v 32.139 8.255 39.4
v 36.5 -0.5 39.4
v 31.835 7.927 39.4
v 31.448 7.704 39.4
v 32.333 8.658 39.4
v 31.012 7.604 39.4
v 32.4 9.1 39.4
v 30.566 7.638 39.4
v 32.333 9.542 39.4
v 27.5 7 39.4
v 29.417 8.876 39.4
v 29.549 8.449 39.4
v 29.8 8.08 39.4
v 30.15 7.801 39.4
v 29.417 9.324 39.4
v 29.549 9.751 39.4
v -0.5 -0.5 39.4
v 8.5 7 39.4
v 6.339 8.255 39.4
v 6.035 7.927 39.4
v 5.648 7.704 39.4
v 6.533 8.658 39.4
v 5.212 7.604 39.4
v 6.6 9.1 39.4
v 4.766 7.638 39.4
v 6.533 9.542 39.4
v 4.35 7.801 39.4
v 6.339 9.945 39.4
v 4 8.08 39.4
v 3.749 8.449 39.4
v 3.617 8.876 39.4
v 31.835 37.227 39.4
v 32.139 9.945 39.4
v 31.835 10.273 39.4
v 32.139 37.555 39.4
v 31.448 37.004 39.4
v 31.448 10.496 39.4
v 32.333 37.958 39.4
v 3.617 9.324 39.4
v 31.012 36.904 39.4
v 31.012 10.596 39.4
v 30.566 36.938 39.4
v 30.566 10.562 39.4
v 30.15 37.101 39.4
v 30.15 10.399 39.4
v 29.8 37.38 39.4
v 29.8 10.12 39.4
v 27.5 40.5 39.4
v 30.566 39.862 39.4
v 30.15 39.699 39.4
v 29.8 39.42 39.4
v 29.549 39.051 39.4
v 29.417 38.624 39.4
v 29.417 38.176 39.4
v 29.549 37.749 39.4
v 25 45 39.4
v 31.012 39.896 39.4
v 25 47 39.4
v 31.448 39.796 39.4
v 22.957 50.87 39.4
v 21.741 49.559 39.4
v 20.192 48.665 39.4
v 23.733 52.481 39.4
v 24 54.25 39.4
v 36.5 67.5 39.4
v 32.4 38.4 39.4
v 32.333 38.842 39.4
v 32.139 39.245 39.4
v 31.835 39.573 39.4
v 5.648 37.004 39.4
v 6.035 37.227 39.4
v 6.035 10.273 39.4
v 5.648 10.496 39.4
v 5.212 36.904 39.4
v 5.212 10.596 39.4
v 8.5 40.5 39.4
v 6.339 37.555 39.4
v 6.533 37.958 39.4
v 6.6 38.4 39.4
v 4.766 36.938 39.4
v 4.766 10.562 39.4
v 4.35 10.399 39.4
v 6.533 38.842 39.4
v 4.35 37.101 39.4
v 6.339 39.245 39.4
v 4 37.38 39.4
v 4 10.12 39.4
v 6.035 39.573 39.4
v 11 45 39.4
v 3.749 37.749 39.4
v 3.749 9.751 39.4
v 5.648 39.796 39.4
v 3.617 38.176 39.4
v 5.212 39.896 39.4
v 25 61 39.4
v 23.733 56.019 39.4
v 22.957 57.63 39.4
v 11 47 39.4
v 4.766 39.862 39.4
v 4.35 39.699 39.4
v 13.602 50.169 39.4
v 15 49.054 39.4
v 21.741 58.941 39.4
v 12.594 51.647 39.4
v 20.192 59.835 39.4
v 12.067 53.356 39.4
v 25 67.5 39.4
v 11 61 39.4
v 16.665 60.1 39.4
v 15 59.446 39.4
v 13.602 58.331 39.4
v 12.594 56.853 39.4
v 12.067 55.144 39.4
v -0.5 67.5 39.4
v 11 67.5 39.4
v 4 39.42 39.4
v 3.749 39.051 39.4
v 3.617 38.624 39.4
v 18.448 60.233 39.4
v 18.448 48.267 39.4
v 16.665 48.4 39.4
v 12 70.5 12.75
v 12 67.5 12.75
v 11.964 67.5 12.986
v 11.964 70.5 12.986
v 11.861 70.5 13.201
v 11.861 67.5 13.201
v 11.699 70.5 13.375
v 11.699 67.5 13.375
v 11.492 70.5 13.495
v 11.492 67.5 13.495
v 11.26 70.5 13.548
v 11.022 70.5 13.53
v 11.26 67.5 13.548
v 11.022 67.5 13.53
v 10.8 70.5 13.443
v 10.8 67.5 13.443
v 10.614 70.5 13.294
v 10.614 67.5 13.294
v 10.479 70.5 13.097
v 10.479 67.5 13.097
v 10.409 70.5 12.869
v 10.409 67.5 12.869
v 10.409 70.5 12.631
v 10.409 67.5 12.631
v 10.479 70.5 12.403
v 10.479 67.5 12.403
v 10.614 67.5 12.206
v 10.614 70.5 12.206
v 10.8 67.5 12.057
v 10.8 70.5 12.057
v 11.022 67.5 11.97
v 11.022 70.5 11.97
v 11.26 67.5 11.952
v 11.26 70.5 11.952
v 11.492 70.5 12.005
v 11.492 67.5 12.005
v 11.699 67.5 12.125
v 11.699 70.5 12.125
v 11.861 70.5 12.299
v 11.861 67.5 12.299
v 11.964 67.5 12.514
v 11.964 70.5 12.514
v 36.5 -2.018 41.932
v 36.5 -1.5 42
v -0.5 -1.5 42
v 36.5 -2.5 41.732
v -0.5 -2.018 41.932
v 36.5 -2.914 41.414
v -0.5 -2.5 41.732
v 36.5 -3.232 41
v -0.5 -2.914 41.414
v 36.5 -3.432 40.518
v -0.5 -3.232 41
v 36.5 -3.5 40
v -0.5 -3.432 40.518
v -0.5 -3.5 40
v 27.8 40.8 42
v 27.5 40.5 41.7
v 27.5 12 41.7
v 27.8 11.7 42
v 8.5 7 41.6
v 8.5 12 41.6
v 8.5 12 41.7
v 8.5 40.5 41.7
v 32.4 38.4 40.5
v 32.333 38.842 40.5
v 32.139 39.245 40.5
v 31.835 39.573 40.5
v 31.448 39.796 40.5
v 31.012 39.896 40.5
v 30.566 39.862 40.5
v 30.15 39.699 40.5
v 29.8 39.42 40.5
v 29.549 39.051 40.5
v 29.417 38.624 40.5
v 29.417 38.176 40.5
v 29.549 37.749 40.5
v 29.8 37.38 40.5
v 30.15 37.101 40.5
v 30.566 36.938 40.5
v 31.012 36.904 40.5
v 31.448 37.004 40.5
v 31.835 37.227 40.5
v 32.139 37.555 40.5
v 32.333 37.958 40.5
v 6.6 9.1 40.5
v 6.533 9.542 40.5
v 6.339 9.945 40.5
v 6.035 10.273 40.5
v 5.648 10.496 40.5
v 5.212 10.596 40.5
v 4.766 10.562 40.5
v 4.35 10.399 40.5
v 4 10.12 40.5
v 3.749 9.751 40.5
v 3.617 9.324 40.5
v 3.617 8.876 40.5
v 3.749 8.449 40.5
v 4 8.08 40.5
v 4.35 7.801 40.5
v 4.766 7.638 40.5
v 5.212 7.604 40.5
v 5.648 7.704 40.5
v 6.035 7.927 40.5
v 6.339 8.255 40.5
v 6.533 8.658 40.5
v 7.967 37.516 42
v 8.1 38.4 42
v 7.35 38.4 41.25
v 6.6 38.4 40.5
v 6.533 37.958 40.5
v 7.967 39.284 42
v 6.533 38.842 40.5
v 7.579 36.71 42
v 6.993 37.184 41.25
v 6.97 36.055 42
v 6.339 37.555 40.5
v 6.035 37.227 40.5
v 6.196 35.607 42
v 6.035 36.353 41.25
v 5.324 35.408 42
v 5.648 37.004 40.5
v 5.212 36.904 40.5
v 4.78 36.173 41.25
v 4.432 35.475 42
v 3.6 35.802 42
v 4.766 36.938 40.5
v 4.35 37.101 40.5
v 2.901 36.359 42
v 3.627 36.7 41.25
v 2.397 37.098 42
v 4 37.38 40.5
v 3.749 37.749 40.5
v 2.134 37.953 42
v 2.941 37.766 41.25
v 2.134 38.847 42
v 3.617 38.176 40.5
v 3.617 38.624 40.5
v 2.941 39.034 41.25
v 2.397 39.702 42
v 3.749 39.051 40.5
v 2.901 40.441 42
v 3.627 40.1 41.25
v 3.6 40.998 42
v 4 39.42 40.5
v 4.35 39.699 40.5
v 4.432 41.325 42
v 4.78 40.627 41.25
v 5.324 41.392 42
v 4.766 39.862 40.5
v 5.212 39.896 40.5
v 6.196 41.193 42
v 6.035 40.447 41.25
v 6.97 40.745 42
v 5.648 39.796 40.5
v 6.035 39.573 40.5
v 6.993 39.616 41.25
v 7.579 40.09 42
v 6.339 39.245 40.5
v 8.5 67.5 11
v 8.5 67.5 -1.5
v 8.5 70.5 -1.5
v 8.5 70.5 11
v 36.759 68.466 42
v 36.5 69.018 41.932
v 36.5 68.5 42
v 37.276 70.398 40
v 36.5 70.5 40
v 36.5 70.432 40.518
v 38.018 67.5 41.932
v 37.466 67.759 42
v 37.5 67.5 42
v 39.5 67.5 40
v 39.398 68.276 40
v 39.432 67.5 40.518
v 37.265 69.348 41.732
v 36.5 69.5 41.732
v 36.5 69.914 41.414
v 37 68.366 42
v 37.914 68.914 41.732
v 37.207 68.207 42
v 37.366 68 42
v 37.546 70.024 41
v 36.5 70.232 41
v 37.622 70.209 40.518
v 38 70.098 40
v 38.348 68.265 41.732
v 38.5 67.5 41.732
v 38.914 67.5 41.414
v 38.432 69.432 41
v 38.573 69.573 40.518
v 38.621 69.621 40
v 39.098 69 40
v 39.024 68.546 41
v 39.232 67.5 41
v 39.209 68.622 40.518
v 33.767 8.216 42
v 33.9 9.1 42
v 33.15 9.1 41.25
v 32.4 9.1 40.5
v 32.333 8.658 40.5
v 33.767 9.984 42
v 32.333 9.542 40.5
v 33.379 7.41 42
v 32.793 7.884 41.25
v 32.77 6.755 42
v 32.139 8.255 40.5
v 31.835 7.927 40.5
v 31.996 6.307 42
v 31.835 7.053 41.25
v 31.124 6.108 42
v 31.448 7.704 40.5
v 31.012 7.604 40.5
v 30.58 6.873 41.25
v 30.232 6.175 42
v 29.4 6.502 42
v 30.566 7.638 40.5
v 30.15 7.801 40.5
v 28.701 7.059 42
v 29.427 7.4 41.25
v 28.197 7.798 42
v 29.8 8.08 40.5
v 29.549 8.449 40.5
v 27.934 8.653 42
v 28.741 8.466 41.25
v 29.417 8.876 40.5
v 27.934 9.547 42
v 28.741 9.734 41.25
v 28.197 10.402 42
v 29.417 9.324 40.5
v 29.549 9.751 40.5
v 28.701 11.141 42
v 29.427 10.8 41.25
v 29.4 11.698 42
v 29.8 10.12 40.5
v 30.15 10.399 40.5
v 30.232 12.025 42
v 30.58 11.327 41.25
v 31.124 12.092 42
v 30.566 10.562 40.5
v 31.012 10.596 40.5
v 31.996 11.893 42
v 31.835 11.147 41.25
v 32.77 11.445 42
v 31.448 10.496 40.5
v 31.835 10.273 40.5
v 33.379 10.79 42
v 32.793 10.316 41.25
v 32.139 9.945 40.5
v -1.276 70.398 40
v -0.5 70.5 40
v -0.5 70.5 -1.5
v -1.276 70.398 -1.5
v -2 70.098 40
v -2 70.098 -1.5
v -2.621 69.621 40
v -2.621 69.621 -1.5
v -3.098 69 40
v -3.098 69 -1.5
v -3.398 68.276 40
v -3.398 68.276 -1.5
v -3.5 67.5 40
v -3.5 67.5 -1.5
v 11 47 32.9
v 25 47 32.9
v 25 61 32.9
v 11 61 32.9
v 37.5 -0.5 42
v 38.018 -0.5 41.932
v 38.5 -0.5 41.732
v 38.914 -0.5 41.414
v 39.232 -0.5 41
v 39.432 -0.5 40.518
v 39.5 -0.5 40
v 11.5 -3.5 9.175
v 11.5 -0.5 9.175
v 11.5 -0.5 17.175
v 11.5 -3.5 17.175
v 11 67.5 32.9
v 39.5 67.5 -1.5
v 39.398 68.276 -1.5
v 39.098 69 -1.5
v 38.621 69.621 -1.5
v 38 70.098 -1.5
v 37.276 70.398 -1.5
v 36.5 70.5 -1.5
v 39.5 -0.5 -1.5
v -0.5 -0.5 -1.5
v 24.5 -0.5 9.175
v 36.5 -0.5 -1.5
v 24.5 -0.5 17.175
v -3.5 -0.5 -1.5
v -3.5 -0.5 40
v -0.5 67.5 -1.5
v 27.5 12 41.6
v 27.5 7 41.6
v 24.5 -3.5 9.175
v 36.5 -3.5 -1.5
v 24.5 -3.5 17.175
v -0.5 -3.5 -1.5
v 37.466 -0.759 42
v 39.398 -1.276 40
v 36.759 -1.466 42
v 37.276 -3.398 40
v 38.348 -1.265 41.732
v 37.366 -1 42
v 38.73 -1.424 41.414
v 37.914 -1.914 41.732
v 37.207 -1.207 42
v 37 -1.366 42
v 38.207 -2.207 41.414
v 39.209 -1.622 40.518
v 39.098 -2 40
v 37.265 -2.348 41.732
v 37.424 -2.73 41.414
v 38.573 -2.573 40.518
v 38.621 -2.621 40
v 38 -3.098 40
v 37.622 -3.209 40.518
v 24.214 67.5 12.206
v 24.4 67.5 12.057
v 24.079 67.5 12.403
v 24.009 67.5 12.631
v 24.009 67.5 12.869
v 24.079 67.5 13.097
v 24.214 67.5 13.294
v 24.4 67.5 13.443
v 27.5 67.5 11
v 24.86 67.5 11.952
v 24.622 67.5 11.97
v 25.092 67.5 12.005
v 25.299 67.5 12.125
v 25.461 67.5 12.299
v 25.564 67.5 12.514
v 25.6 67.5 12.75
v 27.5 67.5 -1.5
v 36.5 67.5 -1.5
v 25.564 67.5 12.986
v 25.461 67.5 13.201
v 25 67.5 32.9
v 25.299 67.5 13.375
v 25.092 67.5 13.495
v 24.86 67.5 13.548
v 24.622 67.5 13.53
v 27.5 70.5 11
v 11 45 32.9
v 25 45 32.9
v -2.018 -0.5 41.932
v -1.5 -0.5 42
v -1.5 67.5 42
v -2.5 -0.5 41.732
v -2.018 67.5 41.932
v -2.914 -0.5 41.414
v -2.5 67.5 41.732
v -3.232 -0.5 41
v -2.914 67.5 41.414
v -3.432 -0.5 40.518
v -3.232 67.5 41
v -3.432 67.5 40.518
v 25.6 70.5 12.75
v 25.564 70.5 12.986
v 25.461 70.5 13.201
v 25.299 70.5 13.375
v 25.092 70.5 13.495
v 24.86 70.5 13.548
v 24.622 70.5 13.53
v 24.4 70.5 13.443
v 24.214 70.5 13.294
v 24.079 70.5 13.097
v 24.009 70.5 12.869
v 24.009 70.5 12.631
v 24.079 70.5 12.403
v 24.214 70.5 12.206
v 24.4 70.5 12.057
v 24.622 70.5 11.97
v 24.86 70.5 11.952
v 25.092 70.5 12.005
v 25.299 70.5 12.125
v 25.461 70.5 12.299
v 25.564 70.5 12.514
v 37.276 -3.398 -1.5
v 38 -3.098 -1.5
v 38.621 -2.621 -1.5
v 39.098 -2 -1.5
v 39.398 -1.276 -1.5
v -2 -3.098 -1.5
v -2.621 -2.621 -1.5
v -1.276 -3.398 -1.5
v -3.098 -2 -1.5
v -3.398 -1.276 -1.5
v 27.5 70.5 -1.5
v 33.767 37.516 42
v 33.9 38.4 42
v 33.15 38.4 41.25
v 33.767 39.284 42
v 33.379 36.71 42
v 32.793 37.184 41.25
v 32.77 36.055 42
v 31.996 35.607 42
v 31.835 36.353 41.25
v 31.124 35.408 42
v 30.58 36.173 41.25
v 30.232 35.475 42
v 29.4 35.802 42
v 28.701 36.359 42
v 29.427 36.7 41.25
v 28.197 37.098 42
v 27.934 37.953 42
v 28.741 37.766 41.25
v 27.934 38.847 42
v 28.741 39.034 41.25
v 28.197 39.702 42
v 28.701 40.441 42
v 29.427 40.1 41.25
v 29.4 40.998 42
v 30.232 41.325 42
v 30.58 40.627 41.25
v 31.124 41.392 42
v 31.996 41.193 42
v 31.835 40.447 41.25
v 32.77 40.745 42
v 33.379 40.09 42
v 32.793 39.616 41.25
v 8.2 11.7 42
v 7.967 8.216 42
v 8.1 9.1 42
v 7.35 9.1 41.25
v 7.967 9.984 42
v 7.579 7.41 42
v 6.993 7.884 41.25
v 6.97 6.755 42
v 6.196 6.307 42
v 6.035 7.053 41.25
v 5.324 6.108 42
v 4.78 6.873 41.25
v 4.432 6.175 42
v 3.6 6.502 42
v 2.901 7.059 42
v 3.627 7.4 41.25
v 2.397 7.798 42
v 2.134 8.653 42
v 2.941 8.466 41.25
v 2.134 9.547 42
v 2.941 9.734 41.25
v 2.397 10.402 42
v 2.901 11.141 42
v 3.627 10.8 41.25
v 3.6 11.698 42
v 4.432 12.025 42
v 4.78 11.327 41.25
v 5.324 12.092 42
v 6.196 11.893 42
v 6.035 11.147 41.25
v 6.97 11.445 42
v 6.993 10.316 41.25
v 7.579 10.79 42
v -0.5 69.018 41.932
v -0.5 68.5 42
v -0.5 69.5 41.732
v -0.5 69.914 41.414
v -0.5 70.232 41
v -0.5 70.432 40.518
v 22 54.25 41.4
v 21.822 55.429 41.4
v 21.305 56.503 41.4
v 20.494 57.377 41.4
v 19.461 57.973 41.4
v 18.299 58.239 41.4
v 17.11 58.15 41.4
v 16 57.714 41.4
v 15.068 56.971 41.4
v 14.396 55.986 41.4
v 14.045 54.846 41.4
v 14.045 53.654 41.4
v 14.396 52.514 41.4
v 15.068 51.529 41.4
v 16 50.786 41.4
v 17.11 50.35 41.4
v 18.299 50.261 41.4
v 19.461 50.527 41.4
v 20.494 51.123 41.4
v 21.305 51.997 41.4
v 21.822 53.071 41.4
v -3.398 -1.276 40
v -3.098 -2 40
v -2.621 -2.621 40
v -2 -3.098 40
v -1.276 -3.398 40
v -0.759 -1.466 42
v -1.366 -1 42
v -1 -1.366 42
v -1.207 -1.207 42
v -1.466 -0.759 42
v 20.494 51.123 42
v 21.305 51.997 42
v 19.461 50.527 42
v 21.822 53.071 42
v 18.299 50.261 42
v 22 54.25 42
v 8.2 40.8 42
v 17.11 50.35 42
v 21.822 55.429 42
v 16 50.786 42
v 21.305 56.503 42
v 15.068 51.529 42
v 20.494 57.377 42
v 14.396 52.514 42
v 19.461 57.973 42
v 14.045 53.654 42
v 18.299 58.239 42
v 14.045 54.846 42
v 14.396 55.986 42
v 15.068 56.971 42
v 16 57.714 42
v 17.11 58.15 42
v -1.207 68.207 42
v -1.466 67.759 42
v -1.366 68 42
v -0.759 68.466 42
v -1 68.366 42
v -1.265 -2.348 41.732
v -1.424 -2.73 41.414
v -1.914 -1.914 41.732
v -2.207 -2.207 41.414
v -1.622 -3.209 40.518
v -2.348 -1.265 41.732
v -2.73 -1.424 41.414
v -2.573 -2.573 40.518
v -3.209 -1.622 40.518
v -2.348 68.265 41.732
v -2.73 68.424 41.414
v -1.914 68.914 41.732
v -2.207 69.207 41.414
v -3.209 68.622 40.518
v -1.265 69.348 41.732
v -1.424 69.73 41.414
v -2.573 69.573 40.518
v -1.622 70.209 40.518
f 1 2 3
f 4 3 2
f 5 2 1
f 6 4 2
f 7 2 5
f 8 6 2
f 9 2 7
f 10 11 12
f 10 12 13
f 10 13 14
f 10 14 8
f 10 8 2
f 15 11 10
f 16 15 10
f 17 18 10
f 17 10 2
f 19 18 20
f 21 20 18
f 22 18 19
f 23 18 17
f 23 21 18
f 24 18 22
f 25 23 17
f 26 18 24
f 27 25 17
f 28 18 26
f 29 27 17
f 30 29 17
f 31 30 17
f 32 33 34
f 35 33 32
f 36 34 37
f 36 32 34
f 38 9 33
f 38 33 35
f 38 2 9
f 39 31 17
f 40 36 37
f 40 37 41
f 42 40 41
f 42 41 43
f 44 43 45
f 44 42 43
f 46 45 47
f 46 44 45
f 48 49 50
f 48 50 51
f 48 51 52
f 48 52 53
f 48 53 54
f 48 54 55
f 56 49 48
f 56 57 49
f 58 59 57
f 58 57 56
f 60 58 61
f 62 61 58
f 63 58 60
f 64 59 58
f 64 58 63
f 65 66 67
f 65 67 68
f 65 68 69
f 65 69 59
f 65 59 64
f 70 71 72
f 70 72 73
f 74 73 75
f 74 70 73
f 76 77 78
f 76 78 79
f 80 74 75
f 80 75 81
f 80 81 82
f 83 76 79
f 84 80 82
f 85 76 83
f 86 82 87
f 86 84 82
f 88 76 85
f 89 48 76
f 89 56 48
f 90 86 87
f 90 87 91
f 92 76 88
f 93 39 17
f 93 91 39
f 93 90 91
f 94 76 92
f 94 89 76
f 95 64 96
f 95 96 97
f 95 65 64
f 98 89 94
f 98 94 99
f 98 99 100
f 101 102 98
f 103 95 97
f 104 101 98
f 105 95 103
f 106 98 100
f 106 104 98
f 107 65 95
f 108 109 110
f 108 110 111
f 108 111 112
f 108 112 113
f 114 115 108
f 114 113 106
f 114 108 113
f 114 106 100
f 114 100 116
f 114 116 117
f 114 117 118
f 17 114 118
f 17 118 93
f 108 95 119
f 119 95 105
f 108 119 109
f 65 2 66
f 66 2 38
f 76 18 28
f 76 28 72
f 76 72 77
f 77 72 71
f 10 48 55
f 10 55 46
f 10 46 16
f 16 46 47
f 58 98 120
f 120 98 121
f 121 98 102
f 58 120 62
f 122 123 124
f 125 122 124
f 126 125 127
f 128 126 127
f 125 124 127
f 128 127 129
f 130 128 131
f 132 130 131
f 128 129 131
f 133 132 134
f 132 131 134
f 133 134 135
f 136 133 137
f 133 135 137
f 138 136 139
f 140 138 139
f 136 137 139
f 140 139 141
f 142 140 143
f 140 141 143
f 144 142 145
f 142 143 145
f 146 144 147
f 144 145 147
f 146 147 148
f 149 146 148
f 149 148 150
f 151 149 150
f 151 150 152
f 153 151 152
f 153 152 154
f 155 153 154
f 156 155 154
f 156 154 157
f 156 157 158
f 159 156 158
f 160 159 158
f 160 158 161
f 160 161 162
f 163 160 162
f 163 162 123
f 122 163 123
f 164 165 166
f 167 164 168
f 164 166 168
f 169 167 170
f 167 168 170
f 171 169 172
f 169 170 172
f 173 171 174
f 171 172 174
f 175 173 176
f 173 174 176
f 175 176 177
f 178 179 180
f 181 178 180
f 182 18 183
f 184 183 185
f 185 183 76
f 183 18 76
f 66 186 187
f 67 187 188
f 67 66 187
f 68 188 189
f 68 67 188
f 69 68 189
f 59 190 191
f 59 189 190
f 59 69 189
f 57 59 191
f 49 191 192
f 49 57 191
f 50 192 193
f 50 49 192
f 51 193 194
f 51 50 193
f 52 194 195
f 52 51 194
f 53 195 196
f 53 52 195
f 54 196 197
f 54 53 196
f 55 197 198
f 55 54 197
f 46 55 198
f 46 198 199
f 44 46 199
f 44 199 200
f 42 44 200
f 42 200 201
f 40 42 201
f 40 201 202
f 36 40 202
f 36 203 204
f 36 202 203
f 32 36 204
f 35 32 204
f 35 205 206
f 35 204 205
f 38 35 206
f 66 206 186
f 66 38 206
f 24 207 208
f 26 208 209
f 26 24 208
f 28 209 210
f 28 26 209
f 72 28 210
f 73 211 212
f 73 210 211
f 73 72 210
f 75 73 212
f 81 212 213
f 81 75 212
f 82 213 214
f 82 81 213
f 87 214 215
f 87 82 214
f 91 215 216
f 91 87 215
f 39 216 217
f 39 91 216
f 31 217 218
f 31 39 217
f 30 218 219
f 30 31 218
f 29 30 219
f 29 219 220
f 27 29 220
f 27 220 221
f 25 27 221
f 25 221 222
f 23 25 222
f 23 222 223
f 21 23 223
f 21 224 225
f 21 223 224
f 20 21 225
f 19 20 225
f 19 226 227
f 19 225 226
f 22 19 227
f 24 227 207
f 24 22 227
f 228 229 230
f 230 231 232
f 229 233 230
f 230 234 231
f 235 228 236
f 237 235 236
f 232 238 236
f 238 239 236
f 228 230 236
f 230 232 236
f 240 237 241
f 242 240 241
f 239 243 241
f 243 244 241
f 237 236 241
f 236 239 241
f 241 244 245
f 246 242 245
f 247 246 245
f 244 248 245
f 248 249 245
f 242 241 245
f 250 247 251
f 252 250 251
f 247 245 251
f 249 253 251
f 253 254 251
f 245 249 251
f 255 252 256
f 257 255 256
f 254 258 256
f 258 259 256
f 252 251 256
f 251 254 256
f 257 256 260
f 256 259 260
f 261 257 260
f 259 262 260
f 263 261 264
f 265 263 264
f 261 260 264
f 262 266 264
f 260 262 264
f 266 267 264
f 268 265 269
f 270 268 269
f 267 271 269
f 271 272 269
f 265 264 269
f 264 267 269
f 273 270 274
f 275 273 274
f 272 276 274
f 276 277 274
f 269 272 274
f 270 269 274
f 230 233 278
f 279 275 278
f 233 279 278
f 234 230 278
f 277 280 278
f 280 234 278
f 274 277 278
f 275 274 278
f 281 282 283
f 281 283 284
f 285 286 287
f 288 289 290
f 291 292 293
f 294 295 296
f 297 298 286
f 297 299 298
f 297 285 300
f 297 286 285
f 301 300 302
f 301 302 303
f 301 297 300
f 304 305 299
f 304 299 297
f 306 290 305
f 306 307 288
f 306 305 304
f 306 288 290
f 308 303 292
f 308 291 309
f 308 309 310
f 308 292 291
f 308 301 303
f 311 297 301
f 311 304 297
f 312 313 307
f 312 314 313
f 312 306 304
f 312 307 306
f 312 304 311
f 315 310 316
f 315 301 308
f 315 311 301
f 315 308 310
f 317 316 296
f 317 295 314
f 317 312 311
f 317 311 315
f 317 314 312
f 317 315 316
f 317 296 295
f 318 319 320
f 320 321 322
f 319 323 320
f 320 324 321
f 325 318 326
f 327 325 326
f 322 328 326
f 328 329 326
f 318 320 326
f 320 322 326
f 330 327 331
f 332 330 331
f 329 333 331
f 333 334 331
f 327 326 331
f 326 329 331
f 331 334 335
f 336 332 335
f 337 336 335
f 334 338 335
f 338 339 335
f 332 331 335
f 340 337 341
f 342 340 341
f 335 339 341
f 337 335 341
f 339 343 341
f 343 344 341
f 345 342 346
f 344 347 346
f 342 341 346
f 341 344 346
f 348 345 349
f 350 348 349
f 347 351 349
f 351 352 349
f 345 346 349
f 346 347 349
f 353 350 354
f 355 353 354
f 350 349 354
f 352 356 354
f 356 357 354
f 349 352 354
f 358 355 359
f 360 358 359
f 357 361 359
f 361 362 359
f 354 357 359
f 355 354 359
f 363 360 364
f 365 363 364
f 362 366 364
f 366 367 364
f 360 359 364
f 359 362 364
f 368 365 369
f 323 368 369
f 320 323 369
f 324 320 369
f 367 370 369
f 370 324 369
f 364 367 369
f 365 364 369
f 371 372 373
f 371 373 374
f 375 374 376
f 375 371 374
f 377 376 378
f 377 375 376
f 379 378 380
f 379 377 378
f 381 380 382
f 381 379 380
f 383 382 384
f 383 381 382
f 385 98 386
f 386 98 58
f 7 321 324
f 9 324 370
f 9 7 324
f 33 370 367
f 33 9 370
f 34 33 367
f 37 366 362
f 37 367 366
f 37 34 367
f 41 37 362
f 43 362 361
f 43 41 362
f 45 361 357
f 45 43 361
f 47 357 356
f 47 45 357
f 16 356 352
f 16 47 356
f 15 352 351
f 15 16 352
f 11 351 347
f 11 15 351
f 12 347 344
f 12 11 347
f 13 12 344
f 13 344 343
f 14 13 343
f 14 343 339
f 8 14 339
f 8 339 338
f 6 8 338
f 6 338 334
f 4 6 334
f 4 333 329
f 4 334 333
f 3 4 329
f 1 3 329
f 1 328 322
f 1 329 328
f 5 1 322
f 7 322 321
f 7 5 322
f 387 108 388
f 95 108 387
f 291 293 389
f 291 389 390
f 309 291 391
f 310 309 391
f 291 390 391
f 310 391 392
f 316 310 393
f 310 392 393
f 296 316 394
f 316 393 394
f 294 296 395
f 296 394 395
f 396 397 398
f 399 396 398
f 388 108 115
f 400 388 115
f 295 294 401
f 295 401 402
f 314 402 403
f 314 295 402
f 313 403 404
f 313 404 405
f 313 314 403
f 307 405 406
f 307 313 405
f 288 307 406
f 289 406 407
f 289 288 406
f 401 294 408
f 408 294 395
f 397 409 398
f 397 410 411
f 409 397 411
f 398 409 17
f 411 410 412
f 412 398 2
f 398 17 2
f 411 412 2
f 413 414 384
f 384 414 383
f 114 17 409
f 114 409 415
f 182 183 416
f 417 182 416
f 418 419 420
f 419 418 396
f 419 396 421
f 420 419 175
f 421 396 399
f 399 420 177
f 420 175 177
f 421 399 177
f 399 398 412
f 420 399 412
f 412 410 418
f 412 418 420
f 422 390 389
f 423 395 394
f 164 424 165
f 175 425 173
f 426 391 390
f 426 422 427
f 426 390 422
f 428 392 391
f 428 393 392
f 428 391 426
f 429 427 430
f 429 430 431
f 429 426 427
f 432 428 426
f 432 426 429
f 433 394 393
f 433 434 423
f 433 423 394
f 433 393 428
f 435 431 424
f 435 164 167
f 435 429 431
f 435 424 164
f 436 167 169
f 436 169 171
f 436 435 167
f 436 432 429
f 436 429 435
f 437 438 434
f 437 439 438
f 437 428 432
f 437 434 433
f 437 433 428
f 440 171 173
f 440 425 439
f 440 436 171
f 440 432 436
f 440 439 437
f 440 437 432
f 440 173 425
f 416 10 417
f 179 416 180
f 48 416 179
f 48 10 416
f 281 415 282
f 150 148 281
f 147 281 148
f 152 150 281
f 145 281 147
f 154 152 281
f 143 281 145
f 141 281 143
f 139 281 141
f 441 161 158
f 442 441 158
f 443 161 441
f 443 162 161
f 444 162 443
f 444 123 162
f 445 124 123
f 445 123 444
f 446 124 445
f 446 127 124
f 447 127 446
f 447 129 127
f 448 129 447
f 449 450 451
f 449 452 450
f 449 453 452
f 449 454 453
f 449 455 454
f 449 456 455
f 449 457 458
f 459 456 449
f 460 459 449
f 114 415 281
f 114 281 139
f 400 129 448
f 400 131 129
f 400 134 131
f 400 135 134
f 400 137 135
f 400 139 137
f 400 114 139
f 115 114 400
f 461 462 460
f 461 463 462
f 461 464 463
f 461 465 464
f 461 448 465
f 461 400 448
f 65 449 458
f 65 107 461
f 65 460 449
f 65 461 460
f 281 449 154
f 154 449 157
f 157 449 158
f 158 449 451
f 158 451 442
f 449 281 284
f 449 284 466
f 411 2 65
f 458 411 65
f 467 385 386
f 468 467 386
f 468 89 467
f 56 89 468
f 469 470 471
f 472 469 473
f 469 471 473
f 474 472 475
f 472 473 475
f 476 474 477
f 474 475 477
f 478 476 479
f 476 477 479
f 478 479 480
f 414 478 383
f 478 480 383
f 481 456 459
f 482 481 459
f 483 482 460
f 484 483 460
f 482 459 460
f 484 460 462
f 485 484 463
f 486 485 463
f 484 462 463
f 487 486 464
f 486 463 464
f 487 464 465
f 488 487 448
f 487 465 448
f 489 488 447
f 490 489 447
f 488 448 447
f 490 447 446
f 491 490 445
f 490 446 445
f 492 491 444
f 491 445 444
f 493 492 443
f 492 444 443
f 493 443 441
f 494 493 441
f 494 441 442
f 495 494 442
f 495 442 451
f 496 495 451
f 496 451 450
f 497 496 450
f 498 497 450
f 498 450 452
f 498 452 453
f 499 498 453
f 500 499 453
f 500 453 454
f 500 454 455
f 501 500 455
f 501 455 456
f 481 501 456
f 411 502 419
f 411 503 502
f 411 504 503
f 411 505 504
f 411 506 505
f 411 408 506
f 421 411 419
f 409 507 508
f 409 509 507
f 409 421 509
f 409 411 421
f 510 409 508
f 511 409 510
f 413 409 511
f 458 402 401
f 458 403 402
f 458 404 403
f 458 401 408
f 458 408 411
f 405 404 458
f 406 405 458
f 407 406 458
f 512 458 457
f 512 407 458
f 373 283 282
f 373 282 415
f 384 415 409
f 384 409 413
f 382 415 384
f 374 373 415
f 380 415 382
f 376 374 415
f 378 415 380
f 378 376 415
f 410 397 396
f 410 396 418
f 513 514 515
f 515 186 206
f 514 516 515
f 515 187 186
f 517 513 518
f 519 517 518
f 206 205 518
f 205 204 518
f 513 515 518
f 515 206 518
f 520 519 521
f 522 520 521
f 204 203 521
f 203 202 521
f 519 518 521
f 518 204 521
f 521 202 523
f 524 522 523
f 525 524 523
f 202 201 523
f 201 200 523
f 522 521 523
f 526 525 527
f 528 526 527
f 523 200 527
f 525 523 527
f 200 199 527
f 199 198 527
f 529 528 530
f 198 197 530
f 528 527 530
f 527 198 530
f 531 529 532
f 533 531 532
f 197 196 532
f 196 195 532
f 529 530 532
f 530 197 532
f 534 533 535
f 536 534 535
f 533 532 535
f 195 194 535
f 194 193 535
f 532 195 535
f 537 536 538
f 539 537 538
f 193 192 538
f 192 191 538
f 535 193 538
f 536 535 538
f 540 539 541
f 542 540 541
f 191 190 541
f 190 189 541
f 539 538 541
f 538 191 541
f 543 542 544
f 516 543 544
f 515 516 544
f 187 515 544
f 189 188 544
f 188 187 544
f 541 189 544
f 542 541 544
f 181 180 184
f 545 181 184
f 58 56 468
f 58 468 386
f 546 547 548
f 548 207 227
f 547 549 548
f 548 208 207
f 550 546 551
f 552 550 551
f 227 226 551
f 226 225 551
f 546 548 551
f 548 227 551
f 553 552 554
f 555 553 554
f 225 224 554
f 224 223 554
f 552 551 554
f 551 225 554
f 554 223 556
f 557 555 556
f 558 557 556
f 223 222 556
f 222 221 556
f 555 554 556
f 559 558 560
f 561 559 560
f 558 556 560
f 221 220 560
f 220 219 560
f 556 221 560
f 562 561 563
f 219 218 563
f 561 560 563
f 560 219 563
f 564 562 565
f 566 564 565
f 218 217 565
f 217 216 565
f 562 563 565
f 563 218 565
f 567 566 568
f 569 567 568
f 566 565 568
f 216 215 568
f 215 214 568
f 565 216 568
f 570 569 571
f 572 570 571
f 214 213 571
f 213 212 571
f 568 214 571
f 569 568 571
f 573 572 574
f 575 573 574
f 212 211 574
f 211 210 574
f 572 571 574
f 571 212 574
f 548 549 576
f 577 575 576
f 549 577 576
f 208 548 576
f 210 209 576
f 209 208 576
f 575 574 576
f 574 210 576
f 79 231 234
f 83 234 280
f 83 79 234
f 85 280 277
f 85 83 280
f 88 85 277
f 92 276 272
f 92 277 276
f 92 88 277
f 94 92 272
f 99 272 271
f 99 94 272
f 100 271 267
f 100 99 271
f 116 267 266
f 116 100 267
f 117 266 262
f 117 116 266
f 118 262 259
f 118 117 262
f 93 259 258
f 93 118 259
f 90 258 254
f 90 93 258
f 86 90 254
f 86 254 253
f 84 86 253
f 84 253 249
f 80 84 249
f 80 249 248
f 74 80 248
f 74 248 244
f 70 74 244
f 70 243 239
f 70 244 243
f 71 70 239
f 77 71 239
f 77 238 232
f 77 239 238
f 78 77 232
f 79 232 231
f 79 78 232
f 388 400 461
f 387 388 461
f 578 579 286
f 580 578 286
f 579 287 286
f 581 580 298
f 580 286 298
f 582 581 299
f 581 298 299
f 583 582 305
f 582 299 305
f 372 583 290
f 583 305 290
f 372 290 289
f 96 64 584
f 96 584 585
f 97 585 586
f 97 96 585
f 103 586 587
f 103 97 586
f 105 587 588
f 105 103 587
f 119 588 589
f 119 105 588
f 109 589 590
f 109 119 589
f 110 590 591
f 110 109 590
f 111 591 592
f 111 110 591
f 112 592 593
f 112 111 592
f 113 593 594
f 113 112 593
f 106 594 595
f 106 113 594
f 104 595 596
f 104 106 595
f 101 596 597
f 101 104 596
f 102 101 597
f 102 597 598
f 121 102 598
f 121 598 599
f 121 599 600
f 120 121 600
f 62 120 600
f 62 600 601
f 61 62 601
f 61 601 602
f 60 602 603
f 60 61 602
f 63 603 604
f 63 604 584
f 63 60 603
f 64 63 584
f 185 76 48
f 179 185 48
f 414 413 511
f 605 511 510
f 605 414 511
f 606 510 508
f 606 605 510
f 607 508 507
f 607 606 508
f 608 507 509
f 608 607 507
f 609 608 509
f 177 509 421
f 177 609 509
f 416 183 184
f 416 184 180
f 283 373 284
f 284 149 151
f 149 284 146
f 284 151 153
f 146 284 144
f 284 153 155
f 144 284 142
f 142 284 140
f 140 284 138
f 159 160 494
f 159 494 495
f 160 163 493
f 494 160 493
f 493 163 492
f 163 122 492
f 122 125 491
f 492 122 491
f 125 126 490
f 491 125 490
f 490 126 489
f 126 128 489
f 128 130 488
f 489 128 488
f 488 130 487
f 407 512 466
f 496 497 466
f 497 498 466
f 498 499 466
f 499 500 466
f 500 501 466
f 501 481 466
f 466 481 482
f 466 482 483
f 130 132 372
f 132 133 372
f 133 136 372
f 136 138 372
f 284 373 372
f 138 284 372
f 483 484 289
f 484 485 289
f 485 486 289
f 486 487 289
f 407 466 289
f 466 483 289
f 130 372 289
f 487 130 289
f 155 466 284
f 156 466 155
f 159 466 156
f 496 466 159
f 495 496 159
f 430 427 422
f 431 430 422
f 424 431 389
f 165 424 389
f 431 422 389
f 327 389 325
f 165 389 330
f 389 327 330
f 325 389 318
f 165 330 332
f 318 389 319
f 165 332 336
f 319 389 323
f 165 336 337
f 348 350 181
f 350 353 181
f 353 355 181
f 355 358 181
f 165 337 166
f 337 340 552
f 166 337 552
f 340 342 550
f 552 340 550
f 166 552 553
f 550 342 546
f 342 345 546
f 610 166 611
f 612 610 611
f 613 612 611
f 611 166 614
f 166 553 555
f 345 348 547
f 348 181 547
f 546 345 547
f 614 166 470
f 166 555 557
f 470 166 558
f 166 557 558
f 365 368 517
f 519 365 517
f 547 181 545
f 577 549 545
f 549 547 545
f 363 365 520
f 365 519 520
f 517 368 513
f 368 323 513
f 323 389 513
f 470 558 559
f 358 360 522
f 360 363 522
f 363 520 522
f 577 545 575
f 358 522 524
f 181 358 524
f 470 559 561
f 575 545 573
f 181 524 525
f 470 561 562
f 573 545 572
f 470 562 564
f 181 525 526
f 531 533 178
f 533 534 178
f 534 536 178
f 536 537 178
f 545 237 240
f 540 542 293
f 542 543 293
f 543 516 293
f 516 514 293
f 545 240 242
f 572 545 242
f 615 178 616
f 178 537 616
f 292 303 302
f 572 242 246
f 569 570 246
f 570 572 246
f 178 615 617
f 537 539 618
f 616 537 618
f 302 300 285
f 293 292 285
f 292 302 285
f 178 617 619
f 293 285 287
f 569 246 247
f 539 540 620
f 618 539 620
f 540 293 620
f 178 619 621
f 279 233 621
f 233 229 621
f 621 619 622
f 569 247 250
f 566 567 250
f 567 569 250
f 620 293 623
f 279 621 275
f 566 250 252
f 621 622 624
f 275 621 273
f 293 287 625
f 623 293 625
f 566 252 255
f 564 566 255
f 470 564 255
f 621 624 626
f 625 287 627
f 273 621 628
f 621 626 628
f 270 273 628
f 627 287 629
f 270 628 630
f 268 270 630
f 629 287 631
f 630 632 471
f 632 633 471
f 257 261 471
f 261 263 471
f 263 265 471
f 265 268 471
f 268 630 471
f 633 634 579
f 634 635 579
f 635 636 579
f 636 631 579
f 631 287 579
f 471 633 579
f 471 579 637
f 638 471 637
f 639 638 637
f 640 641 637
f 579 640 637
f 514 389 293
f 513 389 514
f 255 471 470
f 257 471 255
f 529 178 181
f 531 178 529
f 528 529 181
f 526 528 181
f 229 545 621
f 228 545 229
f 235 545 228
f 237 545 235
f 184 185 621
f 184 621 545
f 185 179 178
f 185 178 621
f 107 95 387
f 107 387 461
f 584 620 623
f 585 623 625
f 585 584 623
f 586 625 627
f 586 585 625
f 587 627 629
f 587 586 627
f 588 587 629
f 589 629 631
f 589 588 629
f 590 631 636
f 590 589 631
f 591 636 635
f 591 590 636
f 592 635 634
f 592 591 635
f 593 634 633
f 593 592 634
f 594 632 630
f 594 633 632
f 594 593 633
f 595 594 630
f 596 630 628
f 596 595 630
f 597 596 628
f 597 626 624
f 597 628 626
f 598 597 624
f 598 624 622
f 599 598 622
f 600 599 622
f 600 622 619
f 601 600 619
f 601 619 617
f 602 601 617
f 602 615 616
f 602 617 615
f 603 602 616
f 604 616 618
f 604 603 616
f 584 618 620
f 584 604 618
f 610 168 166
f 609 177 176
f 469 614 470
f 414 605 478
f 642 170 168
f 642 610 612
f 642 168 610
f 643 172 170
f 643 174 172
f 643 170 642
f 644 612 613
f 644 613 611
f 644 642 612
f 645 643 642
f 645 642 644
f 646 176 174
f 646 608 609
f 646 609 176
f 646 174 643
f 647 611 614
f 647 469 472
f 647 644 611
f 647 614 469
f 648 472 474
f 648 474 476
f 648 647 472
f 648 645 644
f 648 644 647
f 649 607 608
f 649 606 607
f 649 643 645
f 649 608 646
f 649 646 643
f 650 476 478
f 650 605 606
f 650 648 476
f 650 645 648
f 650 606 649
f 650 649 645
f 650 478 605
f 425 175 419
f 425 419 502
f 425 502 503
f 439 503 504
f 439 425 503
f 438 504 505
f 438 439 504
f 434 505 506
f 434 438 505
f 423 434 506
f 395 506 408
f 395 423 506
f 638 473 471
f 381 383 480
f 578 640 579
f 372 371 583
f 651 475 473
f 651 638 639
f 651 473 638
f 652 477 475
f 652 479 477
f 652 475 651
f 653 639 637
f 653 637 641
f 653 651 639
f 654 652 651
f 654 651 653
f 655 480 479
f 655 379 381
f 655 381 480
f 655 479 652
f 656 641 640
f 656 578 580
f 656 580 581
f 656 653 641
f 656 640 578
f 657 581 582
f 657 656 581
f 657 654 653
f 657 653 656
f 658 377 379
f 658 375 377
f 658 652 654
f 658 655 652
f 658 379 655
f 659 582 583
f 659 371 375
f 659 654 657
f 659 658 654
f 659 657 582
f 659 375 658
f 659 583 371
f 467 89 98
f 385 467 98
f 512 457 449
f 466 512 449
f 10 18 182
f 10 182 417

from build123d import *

# Parameters (mm, degrees)
SKETCH003_W       = 37
SKETCH003_H       = 68
PAD002_DEPTH      = 2.6
SKETCH005_R       = 1.5
SKETCH005_R_2     = 4
SKETCH005_W       = 19
SKETCH005_H       = 28.5
POCKET001_DEPTH   = 2.601
SKETCH014_W       = 37
SKETCH014_H       = 68
PAD009_DEPTH      = 2.6
PAD009_DEPTH_BACK = 40.9
SKETCH019_W       = 13
SKETCH019_H       = 8
POCKET005_DEPTH   = 3.501
CHAMFER001_SIZE   = 1.5
SKETCH020_R       = 0.8
SKETCH020_W       = 19
SKETCH020_H       = 12.5
POCKET006_DEPTH   = 3.501
SKETCH034_W       = 14
SKETCH034_H       = 6.5
SKETCH034_H_2     = 2
PAD019_DEPTH      = 6.5
FILLET_R          = 2
CHAMFER_SIZE      = 0.3
CHAMFER002_SIZE   = 2
SKETCH050_W       = 19
SKETCH050_H       = 5
POCKET013_DEPTH   = 2.2


with BuildPart() as part:
    # Sketch003 → Pad002 (new body)
    with BuildSketch(Plane.XY):
        with Locations((18, 33.5)):
            Rectangle(SKETCH003_W, SKETCH003_H)
    extrude(amount=PAD002_DEPTH)

    # Sketch005 → Pocket001 (cut, through all)
    with BuildSketch(Plane.XY):
        with Locations((30.9, 38.4)):
            Circle(SKETCH005_R)
        with Locations((5.1, 38.4)):
            Circle(SKETCH005_R)
        with Locations((5.1, 9.1)):
            Circle(SKETCH005_R)
        with Locations((30.9, 9.1)):
            Circle(SKETCH005_R)
        with Locations((18, 54.25)):
            Circle(SKETCH005_R_2)
        with Locations((18, 26.25)):
            Rectangle(SKETCH005_W, SKETCH005_H)
    extrude(amount=POCKET001_DEPTH, mode=Mode.SUBTRACT)

    # Sketch014 → Pad009 (join, two sides)
    with BuildSketch(Plane.XY) as pad009_sk:
        with BuildLine():
            Line((-0.5, 70.5), (36.5, 70.5))
            ThreePointArc((39.5, 67.5), (38.62132, 69.62132), (36.5, 70.5))
            Line((39.5, 67.5), (39.5, -0.5))
            ThreePointArc((36.5, -3.5), (38.62132, -2.62132), (39.5, -0.5))
            Line((36.5, -3.5), (-0.5, -3.5))
            ThreePointArc((-3.5, -0.5), (-2.62132, -2.62132), (-0.5, -3.5))
            Line((-3.5, -0.5), (-3.5, 67.5))
            ThreePointArc((-0.5, 70.5), (-2.62132, 69.62132), (-3.5, 67.5))
        make_face()
        with Locations((18, 33.5)):
            Rectangle(SKETCH014_W, SKETCH014_H, mode=Mode.SUBTRACT)
    extrude(amount=PAD009_DEPTH)
    extrude(pad009_sk.sketch, amount=-PAD009_DEPTH_BACK)

    # Sketch019 → Pocket005 (cut, through all)
    with BuildSketch(Plane.XZ):
        with Locations((18, -26.225)):
            Rectangle(SKETCH019_W, SKETCH019_H)
    extrude(amount=POCKET005_DEPTH, mode=Mode.SUBTRACT)

    # Chamfer001
    chamfer001_edges = [part.edges().sort_by_distance(p)[0] for p in [
        (3.6, 9.1, 2.6),
        (3.6, 38.4, 2.6),
        (29.4, 38.4, 2.6),
        (29.4, 9.1, 2.6),
    ]]
    chamfer(chamfer001_edges, length=CHAMFER001_SIZE)

    # Sketch020 (on DatumPlane) → Pocket006 (cut, through all)
    with BuildSketch(Plane.XZ.offset(-67)):
        with Locations((11.2, -26.65)):
            Circle(SKETCH020_R)
        with Locations((24.8, -26.65)):
            Circle(SKETCH020_R)
        with Locations((18, -34.65)):
            Rectangle(SKETCH020_W, SKETCH020_H)
    extrude(amount=-POCKET006_DEPTH, mode=Mode.SUBTRACT)

    # Sketch034 → Pad019 (join)
    with BuildSketch(Plane.XY):
        with Locations((18, 64.25)):
            Rectangle(SKETCH034_W, SKETCH034_H)
        with Locations((18, 46)):
            Rectangle(SKETCH034_W, SKETCH034_H_2)
    extrude(amount=-PAD019_DEPTH)

    # Fillet
    fillet_edges = [part.edges().sort_by_distance(p)[0] for p in [
        (39.5, 33.5, 2.6),
    ]]
    fillet(fillet_edges, radius=FILLET_R)

    # Chamfer
    chamfer_edges = [part.edges().sort_by_distance(p)[0] for p in [
        (18, 12, 2.6),
        (8.5, 26.25, 2.6),
        (18, 40.5, 2.6),
        (27.5, 26.25, 2.6),
    ]]
    chamfer(chamfer_edges, length=CHAMFER_SIZE)

    # Chamfer002
    chamfer002_edges = [part.edges().sort_by_distance(p)[0] for p in [
        (14, 54.25, 0),
    ]]
    chamfer(chamfer002_edges, length=CHAMFER002_SIZE)

    # Sketch050 → Pocket013 (cut)
    with BuildSketch(Plane.XY):
        with Locations((18, 9.5)):
            Rectangle(SKETCH050_W, SKETCH050_H)
    extrude(amount=POCKET013_DEPTH, mode=Mode.SUBTRACT)


with BuildPart() as part_1:
    # Body001 placement: moved
    add(part.part.moved(Location((0, 0, 39.4))))


solid = part_1.part
